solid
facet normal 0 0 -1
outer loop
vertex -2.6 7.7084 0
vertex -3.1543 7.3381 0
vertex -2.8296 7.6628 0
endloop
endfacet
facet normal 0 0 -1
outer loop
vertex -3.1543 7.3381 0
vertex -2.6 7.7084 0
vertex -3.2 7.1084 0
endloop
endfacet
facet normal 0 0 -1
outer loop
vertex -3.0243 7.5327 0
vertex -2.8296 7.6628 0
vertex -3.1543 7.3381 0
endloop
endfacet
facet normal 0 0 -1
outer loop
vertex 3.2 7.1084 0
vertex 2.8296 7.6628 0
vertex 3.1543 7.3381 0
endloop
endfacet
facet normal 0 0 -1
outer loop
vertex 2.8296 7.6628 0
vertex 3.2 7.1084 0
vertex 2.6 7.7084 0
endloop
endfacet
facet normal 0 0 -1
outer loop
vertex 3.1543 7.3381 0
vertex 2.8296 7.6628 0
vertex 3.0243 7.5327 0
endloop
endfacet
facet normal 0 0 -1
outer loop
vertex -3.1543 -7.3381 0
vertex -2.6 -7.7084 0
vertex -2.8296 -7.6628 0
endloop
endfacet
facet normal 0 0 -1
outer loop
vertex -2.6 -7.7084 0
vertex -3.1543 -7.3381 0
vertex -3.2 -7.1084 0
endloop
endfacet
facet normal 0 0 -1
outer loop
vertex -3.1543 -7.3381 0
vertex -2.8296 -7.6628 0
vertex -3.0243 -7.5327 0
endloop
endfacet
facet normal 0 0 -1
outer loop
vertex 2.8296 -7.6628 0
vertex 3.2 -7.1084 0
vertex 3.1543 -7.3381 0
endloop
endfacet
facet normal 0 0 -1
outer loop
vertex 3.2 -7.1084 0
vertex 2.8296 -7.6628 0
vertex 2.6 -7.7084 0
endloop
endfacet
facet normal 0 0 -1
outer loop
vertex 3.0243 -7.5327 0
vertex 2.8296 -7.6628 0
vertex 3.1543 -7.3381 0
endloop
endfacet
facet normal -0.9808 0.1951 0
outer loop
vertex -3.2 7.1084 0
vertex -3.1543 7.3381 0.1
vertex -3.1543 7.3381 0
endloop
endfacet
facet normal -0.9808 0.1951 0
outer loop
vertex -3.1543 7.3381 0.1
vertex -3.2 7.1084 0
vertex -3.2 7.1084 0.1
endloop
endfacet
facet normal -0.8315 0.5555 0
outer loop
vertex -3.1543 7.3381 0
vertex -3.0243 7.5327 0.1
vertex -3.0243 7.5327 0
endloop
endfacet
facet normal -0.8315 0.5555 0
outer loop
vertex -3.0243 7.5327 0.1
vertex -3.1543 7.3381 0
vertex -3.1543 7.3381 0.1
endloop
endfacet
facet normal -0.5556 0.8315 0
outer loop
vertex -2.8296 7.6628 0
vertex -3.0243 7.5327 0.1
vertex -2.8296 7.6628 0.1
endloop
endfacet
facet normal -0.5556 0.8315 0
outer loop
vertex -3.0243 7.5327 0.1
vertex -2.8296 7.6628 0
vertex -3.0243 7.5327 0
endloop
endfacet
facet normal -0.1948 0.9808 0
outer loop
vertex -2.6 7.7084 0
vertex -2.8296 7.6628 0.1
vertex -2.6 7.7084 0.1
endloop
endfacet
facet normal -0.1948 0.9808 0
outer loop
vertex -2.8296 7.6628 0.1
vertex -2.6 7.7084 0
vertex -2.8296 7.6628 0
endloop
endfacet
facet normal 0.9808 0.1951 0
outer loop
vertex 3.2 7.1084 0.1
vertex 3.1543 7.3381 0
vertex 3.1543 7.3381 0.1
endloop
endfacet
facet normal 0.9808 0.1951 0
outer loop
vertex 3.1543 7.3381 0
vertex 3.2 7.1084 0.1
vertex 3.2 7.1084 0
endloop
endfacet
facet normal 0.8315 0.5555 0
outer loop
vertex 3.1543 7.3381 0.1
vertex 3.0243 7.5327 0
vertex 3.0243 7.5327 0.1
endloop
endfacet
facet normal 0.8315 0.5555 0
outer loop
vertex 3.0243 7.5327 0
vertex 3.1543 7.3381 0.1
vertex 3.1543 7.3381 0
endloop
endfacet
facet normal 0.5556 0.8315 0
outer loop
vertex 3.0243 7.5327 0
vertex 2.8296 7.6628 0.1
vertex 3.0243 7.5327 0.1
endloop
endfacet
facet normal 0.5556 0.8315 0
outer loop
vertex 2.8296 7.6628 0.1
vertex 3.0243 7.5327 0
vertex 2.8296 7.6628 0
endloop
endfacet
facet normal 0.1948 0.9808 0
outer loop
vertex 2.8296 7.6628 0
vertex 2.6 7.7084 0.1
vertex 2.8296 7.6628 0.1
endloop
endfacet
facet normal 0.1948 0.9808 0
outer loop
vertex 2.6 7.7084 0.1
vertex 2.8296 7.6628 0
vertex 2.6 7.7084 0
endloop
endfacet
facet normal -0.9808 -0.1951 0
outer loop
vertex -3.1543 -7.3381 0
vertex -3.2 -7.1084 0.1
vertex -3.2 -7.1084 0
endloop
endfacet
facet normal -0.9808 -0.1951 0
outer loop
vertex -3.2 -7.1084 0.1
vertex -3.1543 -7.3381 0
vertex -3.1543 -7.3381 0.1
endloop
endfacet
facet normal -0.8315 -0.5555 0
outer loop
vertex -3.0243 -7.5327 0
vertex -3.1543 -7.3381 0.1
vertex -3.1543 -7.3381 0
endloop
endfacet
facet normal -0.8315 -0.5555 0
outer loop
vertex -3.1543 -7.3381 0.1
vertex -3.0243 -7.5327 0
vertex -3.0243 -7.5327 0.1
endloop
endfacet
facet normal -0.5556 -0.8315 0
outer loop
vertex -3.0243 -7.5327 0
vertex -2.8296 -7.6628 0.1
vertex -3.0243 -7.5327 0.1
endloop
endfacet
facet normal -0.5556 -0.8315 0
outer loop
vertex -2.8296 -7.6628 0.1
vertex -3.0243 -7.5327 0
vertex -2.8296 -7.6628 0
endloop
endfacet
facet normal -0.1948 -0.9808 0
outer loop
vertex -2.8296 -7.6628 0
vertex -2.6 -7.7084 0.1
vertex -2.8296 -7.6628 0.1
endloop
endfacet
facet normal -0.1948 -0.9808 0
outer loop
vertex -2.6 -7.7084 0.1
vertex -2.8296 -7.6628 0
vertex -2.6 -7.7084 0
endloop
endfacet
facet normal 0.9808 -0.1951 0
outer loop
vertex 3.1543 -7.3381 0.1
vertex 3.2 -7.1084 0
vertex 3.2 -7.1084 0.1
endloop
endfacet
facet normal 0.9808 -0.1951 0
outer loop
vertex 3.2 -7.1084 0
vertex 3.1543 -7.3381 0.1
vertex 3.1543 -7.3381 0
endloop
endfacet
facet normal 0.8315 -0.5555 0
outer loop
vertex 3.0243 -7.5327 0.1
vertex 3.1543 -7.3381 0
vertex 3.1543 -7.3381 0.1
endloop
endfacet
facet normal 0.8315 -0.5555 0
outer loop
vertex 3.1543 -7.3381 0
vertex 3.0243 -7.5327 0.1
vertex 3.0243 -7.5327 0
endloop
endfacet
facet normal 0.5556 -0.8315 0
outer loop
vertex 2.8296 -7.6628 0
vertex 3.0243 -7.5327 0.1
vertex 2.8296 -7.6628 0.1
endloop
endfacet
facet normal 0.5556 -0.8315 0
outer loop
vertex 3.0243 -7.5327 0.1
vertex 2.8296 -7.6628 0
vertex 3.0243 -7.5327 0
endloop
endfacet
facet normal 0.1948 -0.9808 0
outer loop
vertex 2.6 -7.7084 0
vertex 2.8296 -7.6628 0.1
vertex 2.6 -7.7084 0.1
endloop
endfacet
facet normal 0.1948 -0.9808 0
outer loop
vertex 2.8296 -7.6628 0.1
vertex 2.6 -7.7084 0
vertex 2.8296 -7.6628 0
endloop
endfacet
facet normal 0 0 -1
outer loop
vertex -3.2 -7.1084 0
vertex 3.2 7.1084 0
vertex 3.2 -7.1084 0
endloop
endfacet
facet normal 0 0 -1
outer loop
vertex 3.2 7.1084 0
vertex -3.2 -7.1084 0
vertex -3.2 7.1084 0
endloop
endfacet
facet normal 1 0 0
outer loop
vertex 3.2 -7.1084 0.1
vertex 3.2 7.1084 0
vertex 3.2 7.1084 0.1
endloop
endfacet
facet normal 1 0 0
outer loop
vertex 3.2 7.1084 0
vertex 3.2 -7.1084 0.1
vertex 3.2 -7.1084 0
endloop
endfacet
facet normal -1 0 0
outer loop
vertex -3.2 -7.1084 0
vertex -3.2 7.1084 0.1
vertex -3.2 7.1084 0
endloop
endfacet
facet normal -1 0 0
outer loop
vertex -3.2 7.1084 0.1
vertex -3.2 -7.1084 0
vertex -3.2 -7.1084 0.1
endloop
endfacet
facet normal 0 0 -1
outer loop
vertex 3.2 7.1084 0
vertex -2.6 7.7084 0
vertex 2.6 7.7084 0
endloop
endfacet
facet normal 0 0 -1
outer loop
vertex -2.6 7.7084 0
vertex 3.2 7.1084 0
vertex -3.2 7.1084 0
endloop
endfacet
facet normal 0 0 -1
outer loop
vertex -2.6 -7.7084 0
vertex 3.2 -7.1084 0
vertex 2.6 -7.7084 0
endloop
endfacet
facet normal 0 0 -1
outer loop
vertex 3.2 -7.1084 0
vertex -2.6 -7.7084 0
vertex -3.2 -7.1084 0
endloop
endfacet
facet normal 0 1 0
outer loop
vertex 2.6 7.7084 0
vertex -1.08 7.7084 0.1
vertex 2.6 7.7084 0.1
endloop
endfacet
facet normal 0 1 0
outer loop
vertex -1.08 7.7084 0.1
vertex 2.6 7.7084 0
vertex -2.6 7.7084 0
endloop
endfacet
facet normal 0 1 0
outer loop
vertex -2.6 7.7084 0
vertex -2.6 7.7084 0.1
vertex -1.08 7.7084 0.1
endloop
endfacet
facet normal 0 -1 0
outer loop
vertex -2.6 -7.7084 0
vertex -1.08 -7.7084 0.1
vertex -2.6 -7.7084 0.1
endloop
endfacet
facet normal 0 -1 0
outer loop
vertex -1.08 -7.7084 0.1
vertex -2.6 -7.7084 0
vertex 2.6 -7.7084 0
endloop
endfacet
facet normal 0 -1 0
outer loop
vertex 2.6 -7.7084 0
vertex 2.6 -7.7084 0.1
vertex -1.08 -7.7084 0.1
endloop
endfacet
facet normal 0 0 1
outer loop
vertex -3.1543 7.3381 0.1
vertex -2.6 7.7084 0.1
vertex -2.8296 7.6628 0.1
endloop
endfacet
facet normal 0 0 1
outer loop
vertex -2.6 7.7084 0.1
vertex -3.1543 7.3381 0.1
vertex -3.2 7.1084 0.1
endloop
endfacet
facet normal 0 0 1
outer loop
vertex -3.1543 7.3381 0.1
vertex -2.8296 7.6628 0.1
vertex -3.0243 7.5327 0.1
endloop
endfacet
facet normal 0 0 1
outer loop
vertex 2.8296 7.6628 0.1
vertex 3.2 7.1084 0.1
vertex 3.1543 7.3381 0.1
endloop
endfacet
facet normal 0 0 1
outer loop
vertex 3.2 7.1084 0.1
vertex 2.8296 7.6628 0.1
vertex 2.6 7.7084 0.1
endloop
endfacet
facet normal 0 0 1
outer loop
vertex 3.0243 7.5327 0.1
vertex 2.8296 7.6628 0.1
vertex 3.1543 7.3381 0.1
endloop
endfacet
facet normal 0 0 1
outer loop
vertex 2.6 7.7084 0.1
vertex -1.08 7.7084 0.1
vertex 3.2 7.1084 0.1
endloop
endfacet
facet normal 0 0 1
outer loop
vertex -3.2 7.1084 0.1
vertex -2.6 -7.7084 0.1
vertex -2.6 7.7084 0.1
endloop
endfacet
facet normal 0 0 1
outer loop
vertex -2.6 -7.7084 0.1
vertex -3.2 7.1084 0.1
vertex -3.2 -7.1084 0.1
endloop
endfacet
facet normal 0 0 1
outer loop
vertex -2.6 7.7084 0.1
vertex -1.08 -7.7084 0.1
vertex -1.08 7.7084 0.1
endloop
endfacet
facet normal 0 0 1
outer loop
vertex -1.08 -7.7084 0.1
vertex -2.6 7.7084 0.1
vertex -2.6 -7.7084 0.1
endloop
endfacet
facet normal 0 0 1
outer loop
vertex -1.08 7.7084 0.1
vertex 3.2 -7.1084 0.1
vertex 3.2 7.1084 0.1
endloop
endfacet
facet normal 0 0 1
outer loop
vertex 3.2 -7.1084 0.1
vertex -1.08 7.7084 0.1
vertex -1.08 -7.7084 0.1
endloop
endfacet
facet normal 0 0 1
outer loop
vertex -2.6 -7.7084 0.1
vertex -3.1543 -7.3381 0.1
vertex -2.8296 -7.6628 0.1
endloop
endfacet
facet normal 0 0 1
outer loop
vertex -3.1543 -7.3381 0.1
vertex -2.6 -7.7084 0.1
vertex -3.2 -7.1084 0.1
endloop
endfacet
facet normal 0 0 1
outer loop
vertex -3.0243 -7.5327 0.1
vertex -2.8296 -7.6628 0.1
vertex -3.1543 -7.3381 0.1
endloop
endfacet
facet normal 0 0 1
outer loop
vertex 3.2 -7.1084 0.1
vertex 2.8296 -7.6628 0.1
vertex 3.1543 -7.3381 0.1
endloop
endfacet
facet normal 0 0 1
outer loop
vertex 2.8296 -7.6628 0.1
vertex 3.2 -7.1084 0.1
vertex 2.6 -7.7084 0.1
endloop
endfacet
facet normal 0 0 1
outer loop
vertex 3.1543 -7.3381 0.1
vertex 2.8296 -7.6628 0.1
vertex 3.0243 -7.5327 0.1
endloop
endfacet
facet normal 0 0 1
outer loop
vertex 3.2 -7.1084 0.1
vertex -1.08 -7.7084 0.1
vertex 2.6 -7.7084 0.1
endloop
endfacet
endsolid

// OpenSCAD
// file: ../p/box3u12.scad
use <../lib.scad>
function ldraw_lib__box3u12() = [
// 0 Box with 3 Parallel Faces without Any Edges
// 0 Name: box3u12.dat
// 0 Author: J.C. Tchang [tchang]
// 0 !LDRAW_ORG Primitive UPDATE 2014-02
// 0 !LICENSE Licensed under CC BY 4.0 : see CAreadme.txt
// 
// 0 BFC CERTIFY CCW
  [0,"BFC","CERTIFY"],
  [0,"BFC","CCW"],
// 
// 0 !HISTORY 2014-12-23 [PTadmin] Official Update 2014-02
// 
// 
// 4 16 -1 1 1 1 1 1 1 1 -1 -1 1 -1
  [4,16,-1,1,1,1,1,1,1,1,-1,-1,1,-1],
// 4 16 -1 1 1 -1 0 1 1 0 1 1 1 1
  [4,16,-1,1,1,-1,0,1,1,0,1,1,1,1],
// 4 16 1 1 -1 1 0 -1 -1 0 -1 -1 1 -1
  [4,16,1,1,-1,1,0,-1,-1,0,-1,-1,1,-1],
];
module ldraw_lib__box3u12(step=0, col=false, unit=2/5, alt=false, line=0.2, solid=!$preview)
    makepoly(ldraw_lib__box3u12(), step=step, col=col, unit=unit, alt=alt, line=line, solid=solid);
ldraw_lib__box3u12(line=0.2);
// file: ../p/1-4cyli.scad
use <../lib.scad>
function ldraw_lib__1_4cyli() = [
// 0 Cylinder 0.25
// 0 Name: 1-4cyli.dat
// 0 Author: James Jessiman
// 0 !LDRAW_ORG Primitive UPDATE 2012-01
// 0 !LICENSE Licensed under CC BY 4.0 : see CAreadme.txt
// 
// 0 BFC CERTIFY CCW
  [0,"BFC","CERTIFY"],
  [0,"BFC","CCW"],
// 
// 0 !HISTORY 2002-03-23 [sbliss] Added BFC statement.
// 0 !HISTORY 2002-04-25 [PTadmin] Official Update 2002-02
// 0 !HISTORY 2007-06-22 [PTadmin] Header formatted for Contributor Agreement
// 0 !HISTORY 2008-07-01 [PTadmin] Official Update 2008-01
// 0 !HISTORY 2012-02-16 [Philo] Changed to CCW
// 0 !HISTORY 2012-03-30 [PTadmin] Official Update 2012-01
// 
// 
// 4 16 1 1 0 0.9239 1 0.3827 0.9239 0 0.3827 1 0 0
  [4,16,1,1,0,0.9239,1,0.3827,0.9239,0,0.3827,1,0,0],
// 5 24 1 0 0 1 1 0 0.9239 0 0.3827 1 0 -1
  [5,24,1,0,0,1,1,0,0.9239,0,0.3827,1,0,-1],
// 4 16 0.9239 1 0.3827 0.7071 1 0.7071 0.7071 0 0.7071 0.9239 0 0.3827
  [4,16,0.9239,1,0.3827,0.7071,1,0.7071,0.7071,0,0.7071,0.9239,0,0.3827],
// 5 24 0.9239 0 0.3827 0.9239 1 0.3827 0.7071 0 0.7071 1 0 0
  [5,24,0.9239,0,0.3827,0.9239,1,0.3827,0.7071,0,0.7071,1,0,0],
// 4 16 0.7071 1 0.7071 0.3827 1 0.9239 0.3827 0 0.9239 0.7071 0 0.7071
  [4,16,0.7071,1,0.7071,0.3827,1,0.9239,0.3827,0,0.9239,0.7071,0,0.7071],
// 5 24 0.7071 0 0.7071 0.7071 1 0.7071 0.3827 0 0.9239 0.9239 0 0.3827
  [5,24,0.7071,0,0.7071,0.7071,1,0.7071,0.3827,0,0.9239,0.9239,0,0.3827],
// 4 16 0.3827 1 0.9239 0 1 1 0 0 1 0.3827 0 0.9239
  [4,16,0.3827,1,0.9239,0,1,1,0,0,1,0.3827,0,0.9239],
// 5 24 0.3827 0 0.9239 0.3827 1 0.9239 0 0 1 0.7071 0 0.7071
  [5,24,0.3827,0,0.9239,0.3827,1,0.9239,0,0,1,0.7071,0,0.7071],
// 5 24 0 0 1 0 1 1 0.3827 0 0.9239 -1 0 1
  [5,24,0,0,1,0,1,1,0.3827,0,0.9239,-1,0,1],
];
module ldraw_lib__1_4cyli(step=0, col=false, unit=2/5, alt=false, line=0.2, solid=!$preview)
    makepoly(ldraw_lib__1_4cyli(), step=step, col=col, unit=unit, alt=alt, line=line, solid=solid);
ldraw_lib__1_4cyli(line=0.2);
// file: ../p/1-4chrd.scad
use <../lib.scad>
function ldraw_lib__1_4chrd() = [
// 0 Chord 0.25
// 0 Name: 1-4chrd.dat
// 0 Author: Max Martin Richter [MMR1988]
// 0 !LDRAW_ORG Primitive UPDATE 2023-05
// 0 !LICENSE Licensed under CC BY 4.0 : see CAreadme.txt
// 
// 0 BFC CERTIFY CCW
  [0,"BFC","CERTIFY"],
  [0,"BFC","CCW"],
// 
// 0 !HISTORY 2004-04-22 [PTadmin] Official Update 2004-02
// 0 !HISTORY 2007-10-09 [PTadmin] Header formatted for Contributor Agreement
// 0 !HISTORY 2008-07-01 [PTadmin] Official Update 2008-01
// 0 !HISTORY 2012-08-02 [MMR1988] Re-creation with PrimGen2 and Rectifier
// 0 !HISTORY 2012-08-09 [PTadmin] Official Update 2012-02
// 0 !HISTORY 2023-10-27 [OrionP] Change author to MMR1988 from hafhead
// 0 !HISTORY 2023-10-31 [OrionP] Official Update 2023-05
// 
// 4 16 0.9239 0 0.3827 0.3827 0 0.9239 0 0 1 1 0 0
  [4,16,0.9239,0,0.3827,0.3827,0,0.9239,0,0,1,1,0,0],
// 3 16 0.7071 0 0.7071 0.3827 0 0.9239 0.9239 0 0.3827
  [3,16,0.7071,0,0.7071,0.3827,0,0.9239,0.9239,0,0.3827],
];
module ldraw_lib__1_4chrd(step=0, col=false, unit=2/5, alt=false, line=0.2, solid=!$preview)
    makepoly(ldraw_lib__1_4chrd(), step=step, col=col, unit=unit, alt=alt, line=line, solid=solid);
ldraw_lib__1_4chrd(line=0.2);
// main file
use <../lib.scad>
use <../p/1-4chrd.scad>
use <../p/1-4cyli.scad>
use <../p/box3u12.scad>
function ldraw_lib__6451314b() = [
// 0 Sticker  1.9 x  0.8 with Metallic Silver Left Stripe on Red Background
// 0 Name: 6451314b.dat
// 0 Author: Vincent Messenet [Cheenzo]
// 0 !LDRAW_ORG Part UPDATE 2024-01
// 0 !LICENSE Licensed under CC BY 4.0 : see CAreadme.txt
// 
// 0 BFC CERTIFY CCW
  [0,"BFC","CERTIFY"],
  [0,"BFC","CCW"],
// 
// 0 !KEYWORDS Bricklink 10321stk01, Brickowl 1314396, Chevrolet, Corvette, Icons
// 0 !KEYWORDS Rebrickable 10104784, Set 10321
// 
// 0 !HISTORY 2024-01-29 [OrionP] Official Update 2024-01
// 
// 1 16 -6.5 0 17.7711 -1.5 0 0 0 -1 0 0 0 1.5 1-4chrd.dat
  [1,16,-6.5,0,17.7711,-1.5,0,0,0,-1,0,0,0,1.5, ldraw_lib__1_4chrd()],
// 1 16 6.5 0 17.7711 1.5 0 0 0 -1 0 0 0 1.5 1-4chrd.dat
  [1,16,6.5,0,17.7711,1.5,0,0,0,-1,0,0,0,1.5, ldraw_lib__1_4chrd()],
// 1 16 -6.5 0 -17.7711 -1.5 0 0 0 -1 0 0 0 -1.5 1-4chrd.dat
  [1,16,-6.5,0,-17.7711,-1.5,0,0,0,-1,0,0,0,-1.5, ldraw_lib__1_4chrd()],
// 1 16 6.5 0 -17.7711 1.5 0 0 0 -1 0 0 0 -1.5 1-4chrd.dat
  [1,16,6.5,0,-17.7711,1.5,0,0,0,-1,0,0,0,-1.5, ldraw_lib__1_4chrd()],
// 1 16 -6.5 -.25 17.7711 -1.5 0 0 0 .25 0 0 0 1.5 1-4cyli.dat
  [1,16,-6.5,-.25,17.7711,-1.5,0,0,0,.25,0,0,0,1.5, ldraw_lib__1_4cyli()],
// 1 16 6.5 -.25 17.7711 1.5 0 0 0 .25 0 0 0 1.5 1-4cyli.dat
  [1,16,6.5,-.25,17.7711,1.5,0,0,0,.25,0,0,0,1.5, ldraw_lib__1_4cyli()],
// 1 16 -6.5 -.25 -17.7711 -1.5 0 0 0 .25 0 0 0 -1.5 1-4cyli.dat
  [1,16,-6.5,-.25,-17.7711,-1.5,0,0,0,.25,0,0,0,-1.5, ldraw_lib__1_4cyli()],
// 1 16 6.5 -.25 -17.7711 1.5 0 0 0 .25 0 0 0 -1.5 1-4cyli.dat
  [1,16,6.5,-.25,-17.7711,1.5,0,0,0,.25,0,0,0,-1.5, ldraw_lib__1_4cyli()],
// 1 16 0 -.25 0 0 0 8 0 .25 0 17.7711 0 0 box3u12.dat
  [1,16,0,-.25,0,0,0,8,0,.25,0,17.7711,0,0, ldraw_lib__box3u12()],
// 4 16 6.5 0 19.2711 8 0 17.7711 -8 0 17.7711 -6.5 0 19.2711
  [4,16,6.5,0,19.2711,8,0,17.7711,-8,0,17.7711,-6.5,0,19.2711],
// 4 16 8 0 -17.7711 6.5 0 -19.2711 -6.5 0 -19.2711 -8 0 -17.7711
  [4,16,8,0,-17.7711,6.5,0,-19.2711,-6.5,0,-19.2711,-8,0,-17.7711],
// 4 16 -2.7 -.25 19.2711 6.5 -.25 19.2711 6.5 0 19.2711 -6.5 0 19.2711
  [4,16,-2.7,-.25,19.2711,6.5,-.25,19.2711,6.5,0,19.2711,-6.5,0,19.2711],
// 3 16 -6.5 0 19.2711 -6.5 -.25 19.2711 -2.7 -.25 19.2711
  [3,16,-6.5,0,19.2711,-6.5,-.25,19.2711,-2.7,-.25,19.2711],
// 4 16 -6.5 0 -19.2711 6.5 0 -19.2711 -2.7 -.25 -19.2711 -6.5 -.25 -19.2711
  [4,16,-6.5,0,-19.2711,6.5,0,-19.2711,-2.7,-.25,-19.2711,-6.5,-.25,-19.2711],
// 3 16 6.5 0 -19.2711 6.5 -.25 -19.2711 -2.7 -.25 -19.2711
  [3,16,6.5,0,-19.2711,6.5,-.25,-19.2711,-2.7,-.25,-19.2711],
// 1 4 -6.5 -.25 17.7711 -1.5 0 0 0 1 0 0 0 1.5 1-4chrd.dat
  [1,4,-6.5,-.25,17.7711,-1.5,0,0,0,1,0,0,0,1.5, ldraw_lib__1_4chrd()],
// 1 4 6.5 -.25 17.7711 1.5 0 0 0 1 0 0 0 1.5 1-4chrd.dat
  [1,4,6.5,-.25,17.7711,1.5,0,0,0,1,0,0,0,1.5, ldraw_lib__1_4chrd()],
// 3 4 6.5 -.25 19.2711 -2.7 -.25 19.2711 8 -.25 17.7711
  [3,4,6.5,-.25,19.2711,-2.7,-.25,19.2711,8,-.25,17.7711],
// 4 4 -6.5 -.25 -19.2711 -6.5 -.25 19.2711 -8 -.25 17.7711 -8 -.25 -17.7711
  [4,4,-6.5,-.25,-19.2711,-6.5,-.25,19.2711,-8,-.25,17.7711,-8,-.25,-17.7711],
// 4 80 -6.5 -.25 19.2711 -6.5 -.25 -19.2711 -2.7 -.25 -19.2711 -2.7 -.25 19.2711
  [4,80,-6.5,-.25,19.2711,-6.5,-.25,-19.2711,-2.7,-.25,-19.2711,-2.7,-.25,19.2711],
// 4 4 8 -.25 17.7711 -2.7 -.25 19.2711 -2.7 -.25 -19.2711 8 -.25 -17.7711
  [4,4,8,-.25,17.7711,-2.7,-.25,19.2711,-2.7,-.25,-19.2711,8,-.25,-17.7711],
// 1 4 -6.5 -.25 -17.7711 -1.5 0 0 0 1 0 0 0 -1.5 1-4chrd.dat
  [1,4,-6.5,-.25,-17.7711,-1.5,0,0,0,1,0,0,0,-1.5, ldraw_lib__1_4chrd()],
// 1 4 6.5 -.25 -17.7711 1.5 0 0 0 1 0 0 0 -1.5 1-4chrd.dat
  [1,4,6.5,-.25,-17.7711,1.5,0,0,0,1,0,0,0,-1.5, ldraw_lib__1_4chrd()],
// 3 4 8 -.25 -17.7711 -2.7 -.25 -19.2711 6.5 -.25 -19.2711
  [3,4,8,-.25,-17.7711,-2.7,-.25,-19.2711,6.5,-.25,-19.2711],
];
module ldraw_lib__6451314b(step=0, col=false, unit=2/5, alt=false, line=0.2, solid=!$preview)
    makepoly(ldraw_lib__6451314b(), step=step, col=col, unit=unit, alt=alt, line=line, solid=solid);
ldraw_lib__6451314b(line=0.2);
